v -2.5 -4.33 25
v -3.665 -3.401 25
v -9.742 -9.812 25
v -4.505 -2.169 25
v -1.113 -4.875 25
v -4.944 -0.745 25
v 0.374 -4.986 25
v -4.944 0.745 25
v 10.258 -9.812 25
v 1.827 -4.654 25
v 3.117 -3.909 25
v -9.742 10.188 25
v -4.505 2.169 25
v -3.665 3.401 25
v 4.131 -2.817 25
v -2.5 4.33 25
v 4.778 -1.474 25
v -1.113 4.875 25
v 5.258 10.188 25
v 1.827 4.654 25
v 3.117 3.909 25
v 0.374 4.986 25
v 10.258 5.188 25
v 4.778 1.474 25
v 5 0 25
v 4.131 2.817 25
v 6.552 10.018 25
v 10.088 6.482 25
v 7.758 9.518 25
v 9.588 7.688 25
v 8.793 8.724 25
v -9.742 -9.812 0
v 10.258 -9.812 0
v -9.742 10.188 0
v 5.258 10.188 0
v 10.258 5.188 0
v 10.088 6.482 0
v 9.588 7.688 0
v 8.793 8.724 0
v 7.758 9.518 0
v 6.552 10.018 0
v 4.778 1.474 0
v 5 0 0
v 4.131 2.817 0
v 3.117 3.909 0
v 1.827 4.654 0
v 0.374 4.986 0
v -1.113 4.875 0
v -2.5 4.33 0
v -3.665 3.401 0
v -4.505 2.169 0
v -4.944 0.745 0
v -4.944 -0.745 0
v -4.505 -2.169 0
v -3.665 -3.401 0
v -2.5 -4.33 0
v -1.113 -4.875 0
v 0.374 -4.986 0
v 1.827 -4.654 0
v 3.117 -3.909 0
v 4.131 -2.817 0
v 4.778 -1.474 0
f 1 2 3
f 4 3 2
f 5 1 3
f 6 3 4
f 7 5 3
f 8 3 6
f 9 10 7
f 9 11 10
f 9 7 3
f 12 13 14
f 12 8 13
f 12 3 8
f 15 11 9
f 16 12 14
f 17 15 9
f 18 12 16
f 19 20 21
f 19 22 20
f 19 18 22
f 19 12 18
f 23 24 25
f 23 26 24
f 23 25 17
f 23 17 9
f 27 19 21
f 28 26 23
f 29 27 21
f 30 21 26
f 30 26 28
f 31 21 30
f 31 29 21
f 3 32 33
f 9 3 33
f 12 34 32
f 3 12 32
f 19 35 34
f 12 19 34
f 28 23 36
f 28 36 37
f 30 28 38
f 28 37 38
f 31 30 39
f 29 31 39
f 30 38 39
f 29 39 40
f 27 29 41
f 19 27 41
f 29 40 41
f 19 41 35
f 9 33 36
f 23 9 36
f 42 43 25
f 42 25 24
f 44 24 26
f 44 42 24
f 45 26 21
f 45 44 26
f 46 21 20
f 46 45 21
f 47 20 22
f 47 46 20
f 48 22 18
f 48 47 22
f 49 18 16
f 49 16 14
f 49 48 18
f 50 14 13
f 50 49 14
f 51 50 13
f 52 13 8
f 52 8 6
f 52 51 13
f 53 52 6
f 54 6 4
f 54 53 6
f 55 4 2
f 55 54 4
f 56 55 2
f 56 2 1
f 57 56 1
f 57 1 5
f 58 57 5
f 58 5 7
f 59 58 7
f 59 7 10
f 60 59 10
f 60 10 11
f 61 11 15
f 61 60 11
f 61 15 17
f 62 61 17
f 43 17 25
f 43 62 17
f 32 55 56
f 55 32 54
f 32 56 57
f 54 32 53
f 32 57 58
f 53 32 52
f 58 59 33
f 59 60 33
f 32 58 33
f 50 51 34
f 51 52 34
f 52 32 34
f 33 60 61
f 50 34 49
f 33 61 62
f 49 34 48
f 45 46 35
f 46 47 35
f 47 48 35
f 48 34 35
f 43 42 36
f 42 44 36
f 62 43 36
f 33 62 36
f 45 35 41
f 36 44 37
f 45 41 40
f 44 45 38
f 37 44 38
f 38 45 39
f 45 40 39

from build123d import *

# Parameters (mm, degrees)
F0_R     = 5
F1_DEPTH = 25


with BuildPart() as f1:
    # F0 (on Top) → F1 (new body)
    with BuildSketch(Plane.XY):
        with BuildLine():
            Line((5.25788, 10.188084), (-9.74212, 10.188084))
            Line((-9.74212, 10.188084), (-9.74212, -9.811916))
            Line((-9.74212, -9.811916), (10.25788, -9.811916))
            Line((10.25788, -9.811916), (10.25788, 5.188084))
            ThreePointArc((10.25788, 5.188084), (8.793414, 8.723617), (5.25788, 10.188084))
        make_face()
        Circle(F0_R, mode=Mode.SUBTRACT)
    extrude(amount=F1_DEPTH)


solid = f1.part
